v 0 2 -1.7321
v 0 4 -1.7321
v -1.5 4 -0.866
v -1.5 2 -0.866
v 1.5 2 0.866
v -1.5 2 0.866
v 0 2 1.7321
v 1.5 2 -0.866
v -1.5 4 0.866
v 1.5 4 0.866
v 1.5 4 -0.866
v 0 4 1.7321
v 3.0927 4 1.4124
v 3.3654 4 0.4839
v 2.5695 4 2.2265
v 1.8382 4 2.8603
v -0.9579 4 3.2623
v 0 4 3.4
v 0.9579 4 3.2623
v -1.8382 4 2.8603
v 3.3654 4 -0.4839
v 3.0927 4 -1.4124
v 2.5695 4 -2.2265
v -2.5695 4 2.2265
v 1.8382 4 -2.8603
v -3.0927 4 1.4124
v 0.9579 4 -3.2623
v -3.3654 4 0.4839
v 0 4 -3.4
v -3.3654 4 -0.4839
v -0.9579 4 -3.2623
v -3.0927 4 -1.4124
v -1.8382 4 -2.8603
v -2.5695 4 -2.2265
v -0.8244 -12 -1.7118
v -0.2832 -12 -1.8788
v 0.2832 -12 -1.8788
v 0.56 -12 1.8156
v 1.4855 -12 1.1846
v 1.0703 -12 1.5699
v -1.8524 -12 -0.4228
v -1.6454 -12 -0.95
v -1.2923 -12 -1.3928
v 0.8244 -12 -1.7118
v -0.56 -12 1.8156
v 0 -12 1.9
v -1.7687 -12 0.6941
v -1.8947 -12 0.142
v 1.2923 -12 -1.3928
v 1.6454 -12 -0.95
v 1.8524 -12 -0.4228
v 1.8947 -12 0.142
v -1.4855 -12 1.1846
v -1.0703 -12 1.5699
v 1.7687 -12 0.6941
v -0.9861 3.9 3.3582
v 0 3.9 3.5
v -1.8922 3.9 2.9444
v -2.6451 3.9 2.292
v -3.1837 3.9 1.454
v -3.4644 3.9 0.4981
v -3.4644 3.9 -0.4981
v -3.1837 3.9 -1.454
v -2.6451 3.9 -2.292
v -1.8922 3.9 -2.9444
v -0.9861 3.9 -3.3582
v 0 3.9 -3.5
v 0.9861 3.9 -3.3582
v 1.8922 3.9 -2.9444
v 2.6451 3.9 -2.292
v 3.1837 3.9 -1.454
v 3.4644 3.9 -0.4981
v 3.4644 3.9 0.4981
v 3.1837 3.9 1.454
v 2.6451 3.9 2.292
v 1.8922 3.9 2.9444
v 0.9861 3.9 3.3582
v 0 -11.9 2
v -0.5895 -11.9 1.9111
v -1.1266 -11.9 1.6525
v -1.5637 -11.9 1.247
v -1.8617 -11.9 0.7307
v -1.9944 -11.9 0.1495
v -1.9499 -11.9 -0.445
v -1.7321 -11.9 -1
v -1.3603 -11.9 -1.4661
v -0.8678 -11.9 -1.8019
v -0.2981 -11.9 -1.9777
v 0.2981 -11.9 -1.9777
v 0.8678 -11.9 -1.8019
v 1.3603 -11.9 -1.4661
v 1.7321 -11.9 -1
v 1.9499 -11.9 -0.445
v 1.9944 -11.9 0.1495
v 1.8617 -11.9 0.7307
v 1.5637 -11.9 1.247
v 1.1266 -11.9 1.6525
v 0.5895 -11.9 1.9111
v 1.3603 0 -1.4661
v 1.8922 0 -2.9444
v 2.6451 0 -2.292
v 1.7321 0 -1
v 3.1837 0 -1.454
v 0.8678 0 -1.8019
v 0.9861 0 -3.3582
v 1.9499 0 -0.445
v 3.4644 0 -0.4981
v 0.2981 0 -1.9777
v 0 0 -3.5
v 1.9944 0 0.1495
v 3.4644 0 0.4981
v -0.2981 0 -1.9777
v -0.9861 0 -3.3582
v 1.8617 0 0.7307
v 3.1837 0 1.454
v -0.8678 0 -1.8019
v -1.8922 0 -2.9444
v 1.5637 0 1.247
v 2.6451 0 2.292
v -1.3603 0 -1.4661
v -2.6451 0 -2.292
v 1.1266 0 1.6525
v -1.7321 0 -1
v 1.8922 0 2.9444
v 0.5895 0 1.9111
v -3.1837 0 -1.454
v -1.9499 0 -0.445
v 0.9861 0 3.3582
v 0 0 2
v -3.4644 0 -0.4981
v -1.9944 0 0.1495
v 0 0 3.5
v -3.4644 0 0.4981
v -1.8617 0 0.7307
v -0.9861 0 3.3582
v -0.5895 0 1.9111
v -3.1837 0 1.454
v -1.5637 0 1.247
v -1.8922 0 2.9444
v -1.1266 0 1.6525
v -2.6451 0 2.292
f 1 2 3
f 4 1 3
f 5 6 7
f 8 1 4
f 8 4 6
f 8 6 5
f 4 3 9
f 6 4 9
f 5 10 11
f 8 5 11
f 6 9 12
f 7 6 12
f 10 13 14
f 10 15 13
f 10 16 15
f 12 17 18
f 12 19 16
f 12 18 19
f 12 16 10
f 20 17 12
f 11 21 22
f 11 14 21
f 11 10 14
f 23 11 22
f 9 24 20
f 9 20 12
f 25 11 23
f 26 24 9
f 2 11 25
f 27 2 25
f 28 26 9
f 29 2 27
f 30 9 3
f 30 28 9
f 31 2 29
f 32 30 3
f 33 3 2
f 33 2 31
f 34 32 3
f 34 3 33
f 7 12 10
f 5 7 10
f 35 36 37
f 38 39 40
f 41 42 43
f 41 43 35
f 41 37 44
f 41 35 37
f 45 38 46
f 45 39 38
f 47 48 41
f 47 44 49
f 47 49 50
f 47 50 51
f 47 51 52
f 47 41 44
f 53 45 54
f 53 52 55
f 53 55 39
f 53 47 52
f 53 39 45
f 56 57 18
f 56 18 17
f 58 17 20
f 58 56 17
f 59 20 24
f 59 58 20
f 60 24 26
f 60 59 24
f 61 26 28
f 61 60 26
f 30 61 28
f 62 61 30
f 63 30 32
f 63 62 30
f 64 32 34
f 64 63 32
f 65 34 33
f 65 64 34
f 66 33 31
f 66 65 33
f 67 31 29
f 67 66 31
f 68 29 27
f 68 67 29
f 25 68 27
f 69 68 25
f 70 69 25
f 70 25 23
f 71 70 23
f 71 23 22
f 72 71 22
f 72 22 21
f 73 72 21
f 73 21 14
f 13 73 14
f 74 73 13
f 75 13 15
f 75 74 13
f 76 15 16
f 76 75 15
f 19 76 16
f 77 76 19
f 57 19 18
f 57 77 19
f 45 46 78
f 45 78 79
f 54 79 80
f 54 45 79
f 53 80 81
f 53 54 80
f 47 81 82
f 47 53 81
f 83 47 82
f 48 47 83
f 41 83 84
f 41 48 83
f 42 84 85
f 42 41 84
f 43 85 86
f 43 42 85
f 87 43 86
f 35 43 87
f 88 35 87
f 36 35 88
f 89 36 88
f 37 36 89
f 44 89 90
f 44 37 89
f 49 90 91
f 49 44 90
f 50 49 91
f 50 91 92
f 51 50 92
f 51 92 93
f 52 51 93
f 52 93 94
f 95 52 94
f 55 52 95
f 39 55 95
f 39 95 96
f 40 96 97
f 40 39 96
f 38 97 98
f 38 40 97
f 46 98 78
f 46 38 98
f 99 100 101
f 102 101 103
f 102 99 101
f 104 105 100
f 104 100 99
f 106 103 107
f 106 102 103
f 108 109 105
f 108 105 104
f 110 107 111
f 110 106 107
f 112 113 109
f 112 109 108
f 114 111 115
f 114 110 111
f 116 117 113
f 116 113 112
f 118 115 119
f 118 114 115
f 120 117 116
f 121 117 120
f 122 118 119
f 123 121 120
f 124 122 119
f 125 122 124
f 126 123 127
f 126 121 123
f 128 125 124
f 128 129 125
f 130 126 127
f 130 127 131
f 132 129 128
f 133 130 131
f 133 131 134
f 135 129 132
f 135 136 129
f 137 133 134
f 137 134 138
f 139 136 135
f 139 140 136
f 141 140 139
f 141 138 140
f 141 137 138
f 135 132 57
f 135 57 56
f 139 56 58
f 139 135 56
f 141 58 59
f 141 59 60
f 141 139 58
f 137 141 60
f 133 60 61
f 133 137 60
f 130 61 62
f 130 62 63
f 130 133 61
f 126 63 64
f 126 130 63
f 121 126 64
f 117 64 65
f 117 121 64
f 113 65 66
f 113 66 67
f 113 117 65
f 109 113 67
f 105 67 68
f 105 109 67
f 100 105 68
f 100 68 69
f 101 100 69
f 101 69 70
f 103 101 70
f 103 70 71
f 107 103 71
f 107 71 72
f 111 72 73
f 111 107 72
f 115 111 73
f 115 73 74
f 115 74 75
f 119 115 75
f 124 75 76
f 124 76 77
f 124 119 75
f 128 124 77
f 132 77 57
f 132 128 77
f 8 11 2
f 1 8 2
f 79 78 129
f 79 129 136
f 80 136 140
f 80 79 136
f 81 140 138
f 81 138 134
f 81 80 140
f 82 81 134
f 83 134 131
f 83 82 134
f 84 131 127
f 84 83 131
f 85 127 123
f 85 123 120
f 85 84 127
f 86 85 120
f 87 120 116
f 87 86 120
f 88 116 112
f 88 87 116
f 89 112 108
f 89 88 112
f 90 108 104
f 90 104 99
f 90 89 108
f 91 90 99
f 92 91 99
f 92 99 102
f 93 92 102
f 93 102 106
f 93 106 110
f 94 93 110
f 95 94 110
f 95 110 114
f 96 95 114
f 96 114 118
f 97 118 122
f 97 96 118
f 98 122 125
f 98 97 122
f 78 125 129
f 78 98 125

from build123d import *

# Parameters (mm, degrees)
SMUSSO1_SIZE             = 0.1
TAGLIO_ESTRUSIONE1_DEPTH = 2


with BuildPart() as part:
    # Schizzo1 → Rivoluzione1 (revolve)
    with BuildSketch(Plane.XY, mode=Mode.PRIVATE) as rivoluzione1_sk:
        Polygon((0, 0), (0, 4), (3.5, 4), (3.5, 0), (2, 0), (2, -12), (0, -12), align=None)
    revolve(rivoluzione1_sk.sketch.rotate(Axis((0, 28.388481997, 0), (0, -1, 0)), 90), axis=Axis((0, 28.388481997, 0), (0, -1, 0)))

    # Smusso1
    smusso1_edges = [part.edges().sort_by_distance(p)[0] for p in [
        (0, -12, -2),
        (0, 4, -3.5),
    ]]
    chamfer(smusso1_edges, length=SMUSSO1_SIZE)

    # Schizzo2 → Taglio-Estrusione1 (cut)
    with BuildSketch(Plane(origin=(0, 4, 0), x_dir=(1, 0, 0), z_dir=(0, 1, 0))):
        Polygon((0, 1.732050808), (-1.5, 0.866025404), (-1.5, -0.866025404), (0, -1.732050808), (1.5, -0.866025404), (1.5, 0.866025404), align=None)
    extrude(amount=-TAGLIO_ESTRUSIONE1_DEPTH, mode=Mode.SUBTRACT)


solid = part.part
